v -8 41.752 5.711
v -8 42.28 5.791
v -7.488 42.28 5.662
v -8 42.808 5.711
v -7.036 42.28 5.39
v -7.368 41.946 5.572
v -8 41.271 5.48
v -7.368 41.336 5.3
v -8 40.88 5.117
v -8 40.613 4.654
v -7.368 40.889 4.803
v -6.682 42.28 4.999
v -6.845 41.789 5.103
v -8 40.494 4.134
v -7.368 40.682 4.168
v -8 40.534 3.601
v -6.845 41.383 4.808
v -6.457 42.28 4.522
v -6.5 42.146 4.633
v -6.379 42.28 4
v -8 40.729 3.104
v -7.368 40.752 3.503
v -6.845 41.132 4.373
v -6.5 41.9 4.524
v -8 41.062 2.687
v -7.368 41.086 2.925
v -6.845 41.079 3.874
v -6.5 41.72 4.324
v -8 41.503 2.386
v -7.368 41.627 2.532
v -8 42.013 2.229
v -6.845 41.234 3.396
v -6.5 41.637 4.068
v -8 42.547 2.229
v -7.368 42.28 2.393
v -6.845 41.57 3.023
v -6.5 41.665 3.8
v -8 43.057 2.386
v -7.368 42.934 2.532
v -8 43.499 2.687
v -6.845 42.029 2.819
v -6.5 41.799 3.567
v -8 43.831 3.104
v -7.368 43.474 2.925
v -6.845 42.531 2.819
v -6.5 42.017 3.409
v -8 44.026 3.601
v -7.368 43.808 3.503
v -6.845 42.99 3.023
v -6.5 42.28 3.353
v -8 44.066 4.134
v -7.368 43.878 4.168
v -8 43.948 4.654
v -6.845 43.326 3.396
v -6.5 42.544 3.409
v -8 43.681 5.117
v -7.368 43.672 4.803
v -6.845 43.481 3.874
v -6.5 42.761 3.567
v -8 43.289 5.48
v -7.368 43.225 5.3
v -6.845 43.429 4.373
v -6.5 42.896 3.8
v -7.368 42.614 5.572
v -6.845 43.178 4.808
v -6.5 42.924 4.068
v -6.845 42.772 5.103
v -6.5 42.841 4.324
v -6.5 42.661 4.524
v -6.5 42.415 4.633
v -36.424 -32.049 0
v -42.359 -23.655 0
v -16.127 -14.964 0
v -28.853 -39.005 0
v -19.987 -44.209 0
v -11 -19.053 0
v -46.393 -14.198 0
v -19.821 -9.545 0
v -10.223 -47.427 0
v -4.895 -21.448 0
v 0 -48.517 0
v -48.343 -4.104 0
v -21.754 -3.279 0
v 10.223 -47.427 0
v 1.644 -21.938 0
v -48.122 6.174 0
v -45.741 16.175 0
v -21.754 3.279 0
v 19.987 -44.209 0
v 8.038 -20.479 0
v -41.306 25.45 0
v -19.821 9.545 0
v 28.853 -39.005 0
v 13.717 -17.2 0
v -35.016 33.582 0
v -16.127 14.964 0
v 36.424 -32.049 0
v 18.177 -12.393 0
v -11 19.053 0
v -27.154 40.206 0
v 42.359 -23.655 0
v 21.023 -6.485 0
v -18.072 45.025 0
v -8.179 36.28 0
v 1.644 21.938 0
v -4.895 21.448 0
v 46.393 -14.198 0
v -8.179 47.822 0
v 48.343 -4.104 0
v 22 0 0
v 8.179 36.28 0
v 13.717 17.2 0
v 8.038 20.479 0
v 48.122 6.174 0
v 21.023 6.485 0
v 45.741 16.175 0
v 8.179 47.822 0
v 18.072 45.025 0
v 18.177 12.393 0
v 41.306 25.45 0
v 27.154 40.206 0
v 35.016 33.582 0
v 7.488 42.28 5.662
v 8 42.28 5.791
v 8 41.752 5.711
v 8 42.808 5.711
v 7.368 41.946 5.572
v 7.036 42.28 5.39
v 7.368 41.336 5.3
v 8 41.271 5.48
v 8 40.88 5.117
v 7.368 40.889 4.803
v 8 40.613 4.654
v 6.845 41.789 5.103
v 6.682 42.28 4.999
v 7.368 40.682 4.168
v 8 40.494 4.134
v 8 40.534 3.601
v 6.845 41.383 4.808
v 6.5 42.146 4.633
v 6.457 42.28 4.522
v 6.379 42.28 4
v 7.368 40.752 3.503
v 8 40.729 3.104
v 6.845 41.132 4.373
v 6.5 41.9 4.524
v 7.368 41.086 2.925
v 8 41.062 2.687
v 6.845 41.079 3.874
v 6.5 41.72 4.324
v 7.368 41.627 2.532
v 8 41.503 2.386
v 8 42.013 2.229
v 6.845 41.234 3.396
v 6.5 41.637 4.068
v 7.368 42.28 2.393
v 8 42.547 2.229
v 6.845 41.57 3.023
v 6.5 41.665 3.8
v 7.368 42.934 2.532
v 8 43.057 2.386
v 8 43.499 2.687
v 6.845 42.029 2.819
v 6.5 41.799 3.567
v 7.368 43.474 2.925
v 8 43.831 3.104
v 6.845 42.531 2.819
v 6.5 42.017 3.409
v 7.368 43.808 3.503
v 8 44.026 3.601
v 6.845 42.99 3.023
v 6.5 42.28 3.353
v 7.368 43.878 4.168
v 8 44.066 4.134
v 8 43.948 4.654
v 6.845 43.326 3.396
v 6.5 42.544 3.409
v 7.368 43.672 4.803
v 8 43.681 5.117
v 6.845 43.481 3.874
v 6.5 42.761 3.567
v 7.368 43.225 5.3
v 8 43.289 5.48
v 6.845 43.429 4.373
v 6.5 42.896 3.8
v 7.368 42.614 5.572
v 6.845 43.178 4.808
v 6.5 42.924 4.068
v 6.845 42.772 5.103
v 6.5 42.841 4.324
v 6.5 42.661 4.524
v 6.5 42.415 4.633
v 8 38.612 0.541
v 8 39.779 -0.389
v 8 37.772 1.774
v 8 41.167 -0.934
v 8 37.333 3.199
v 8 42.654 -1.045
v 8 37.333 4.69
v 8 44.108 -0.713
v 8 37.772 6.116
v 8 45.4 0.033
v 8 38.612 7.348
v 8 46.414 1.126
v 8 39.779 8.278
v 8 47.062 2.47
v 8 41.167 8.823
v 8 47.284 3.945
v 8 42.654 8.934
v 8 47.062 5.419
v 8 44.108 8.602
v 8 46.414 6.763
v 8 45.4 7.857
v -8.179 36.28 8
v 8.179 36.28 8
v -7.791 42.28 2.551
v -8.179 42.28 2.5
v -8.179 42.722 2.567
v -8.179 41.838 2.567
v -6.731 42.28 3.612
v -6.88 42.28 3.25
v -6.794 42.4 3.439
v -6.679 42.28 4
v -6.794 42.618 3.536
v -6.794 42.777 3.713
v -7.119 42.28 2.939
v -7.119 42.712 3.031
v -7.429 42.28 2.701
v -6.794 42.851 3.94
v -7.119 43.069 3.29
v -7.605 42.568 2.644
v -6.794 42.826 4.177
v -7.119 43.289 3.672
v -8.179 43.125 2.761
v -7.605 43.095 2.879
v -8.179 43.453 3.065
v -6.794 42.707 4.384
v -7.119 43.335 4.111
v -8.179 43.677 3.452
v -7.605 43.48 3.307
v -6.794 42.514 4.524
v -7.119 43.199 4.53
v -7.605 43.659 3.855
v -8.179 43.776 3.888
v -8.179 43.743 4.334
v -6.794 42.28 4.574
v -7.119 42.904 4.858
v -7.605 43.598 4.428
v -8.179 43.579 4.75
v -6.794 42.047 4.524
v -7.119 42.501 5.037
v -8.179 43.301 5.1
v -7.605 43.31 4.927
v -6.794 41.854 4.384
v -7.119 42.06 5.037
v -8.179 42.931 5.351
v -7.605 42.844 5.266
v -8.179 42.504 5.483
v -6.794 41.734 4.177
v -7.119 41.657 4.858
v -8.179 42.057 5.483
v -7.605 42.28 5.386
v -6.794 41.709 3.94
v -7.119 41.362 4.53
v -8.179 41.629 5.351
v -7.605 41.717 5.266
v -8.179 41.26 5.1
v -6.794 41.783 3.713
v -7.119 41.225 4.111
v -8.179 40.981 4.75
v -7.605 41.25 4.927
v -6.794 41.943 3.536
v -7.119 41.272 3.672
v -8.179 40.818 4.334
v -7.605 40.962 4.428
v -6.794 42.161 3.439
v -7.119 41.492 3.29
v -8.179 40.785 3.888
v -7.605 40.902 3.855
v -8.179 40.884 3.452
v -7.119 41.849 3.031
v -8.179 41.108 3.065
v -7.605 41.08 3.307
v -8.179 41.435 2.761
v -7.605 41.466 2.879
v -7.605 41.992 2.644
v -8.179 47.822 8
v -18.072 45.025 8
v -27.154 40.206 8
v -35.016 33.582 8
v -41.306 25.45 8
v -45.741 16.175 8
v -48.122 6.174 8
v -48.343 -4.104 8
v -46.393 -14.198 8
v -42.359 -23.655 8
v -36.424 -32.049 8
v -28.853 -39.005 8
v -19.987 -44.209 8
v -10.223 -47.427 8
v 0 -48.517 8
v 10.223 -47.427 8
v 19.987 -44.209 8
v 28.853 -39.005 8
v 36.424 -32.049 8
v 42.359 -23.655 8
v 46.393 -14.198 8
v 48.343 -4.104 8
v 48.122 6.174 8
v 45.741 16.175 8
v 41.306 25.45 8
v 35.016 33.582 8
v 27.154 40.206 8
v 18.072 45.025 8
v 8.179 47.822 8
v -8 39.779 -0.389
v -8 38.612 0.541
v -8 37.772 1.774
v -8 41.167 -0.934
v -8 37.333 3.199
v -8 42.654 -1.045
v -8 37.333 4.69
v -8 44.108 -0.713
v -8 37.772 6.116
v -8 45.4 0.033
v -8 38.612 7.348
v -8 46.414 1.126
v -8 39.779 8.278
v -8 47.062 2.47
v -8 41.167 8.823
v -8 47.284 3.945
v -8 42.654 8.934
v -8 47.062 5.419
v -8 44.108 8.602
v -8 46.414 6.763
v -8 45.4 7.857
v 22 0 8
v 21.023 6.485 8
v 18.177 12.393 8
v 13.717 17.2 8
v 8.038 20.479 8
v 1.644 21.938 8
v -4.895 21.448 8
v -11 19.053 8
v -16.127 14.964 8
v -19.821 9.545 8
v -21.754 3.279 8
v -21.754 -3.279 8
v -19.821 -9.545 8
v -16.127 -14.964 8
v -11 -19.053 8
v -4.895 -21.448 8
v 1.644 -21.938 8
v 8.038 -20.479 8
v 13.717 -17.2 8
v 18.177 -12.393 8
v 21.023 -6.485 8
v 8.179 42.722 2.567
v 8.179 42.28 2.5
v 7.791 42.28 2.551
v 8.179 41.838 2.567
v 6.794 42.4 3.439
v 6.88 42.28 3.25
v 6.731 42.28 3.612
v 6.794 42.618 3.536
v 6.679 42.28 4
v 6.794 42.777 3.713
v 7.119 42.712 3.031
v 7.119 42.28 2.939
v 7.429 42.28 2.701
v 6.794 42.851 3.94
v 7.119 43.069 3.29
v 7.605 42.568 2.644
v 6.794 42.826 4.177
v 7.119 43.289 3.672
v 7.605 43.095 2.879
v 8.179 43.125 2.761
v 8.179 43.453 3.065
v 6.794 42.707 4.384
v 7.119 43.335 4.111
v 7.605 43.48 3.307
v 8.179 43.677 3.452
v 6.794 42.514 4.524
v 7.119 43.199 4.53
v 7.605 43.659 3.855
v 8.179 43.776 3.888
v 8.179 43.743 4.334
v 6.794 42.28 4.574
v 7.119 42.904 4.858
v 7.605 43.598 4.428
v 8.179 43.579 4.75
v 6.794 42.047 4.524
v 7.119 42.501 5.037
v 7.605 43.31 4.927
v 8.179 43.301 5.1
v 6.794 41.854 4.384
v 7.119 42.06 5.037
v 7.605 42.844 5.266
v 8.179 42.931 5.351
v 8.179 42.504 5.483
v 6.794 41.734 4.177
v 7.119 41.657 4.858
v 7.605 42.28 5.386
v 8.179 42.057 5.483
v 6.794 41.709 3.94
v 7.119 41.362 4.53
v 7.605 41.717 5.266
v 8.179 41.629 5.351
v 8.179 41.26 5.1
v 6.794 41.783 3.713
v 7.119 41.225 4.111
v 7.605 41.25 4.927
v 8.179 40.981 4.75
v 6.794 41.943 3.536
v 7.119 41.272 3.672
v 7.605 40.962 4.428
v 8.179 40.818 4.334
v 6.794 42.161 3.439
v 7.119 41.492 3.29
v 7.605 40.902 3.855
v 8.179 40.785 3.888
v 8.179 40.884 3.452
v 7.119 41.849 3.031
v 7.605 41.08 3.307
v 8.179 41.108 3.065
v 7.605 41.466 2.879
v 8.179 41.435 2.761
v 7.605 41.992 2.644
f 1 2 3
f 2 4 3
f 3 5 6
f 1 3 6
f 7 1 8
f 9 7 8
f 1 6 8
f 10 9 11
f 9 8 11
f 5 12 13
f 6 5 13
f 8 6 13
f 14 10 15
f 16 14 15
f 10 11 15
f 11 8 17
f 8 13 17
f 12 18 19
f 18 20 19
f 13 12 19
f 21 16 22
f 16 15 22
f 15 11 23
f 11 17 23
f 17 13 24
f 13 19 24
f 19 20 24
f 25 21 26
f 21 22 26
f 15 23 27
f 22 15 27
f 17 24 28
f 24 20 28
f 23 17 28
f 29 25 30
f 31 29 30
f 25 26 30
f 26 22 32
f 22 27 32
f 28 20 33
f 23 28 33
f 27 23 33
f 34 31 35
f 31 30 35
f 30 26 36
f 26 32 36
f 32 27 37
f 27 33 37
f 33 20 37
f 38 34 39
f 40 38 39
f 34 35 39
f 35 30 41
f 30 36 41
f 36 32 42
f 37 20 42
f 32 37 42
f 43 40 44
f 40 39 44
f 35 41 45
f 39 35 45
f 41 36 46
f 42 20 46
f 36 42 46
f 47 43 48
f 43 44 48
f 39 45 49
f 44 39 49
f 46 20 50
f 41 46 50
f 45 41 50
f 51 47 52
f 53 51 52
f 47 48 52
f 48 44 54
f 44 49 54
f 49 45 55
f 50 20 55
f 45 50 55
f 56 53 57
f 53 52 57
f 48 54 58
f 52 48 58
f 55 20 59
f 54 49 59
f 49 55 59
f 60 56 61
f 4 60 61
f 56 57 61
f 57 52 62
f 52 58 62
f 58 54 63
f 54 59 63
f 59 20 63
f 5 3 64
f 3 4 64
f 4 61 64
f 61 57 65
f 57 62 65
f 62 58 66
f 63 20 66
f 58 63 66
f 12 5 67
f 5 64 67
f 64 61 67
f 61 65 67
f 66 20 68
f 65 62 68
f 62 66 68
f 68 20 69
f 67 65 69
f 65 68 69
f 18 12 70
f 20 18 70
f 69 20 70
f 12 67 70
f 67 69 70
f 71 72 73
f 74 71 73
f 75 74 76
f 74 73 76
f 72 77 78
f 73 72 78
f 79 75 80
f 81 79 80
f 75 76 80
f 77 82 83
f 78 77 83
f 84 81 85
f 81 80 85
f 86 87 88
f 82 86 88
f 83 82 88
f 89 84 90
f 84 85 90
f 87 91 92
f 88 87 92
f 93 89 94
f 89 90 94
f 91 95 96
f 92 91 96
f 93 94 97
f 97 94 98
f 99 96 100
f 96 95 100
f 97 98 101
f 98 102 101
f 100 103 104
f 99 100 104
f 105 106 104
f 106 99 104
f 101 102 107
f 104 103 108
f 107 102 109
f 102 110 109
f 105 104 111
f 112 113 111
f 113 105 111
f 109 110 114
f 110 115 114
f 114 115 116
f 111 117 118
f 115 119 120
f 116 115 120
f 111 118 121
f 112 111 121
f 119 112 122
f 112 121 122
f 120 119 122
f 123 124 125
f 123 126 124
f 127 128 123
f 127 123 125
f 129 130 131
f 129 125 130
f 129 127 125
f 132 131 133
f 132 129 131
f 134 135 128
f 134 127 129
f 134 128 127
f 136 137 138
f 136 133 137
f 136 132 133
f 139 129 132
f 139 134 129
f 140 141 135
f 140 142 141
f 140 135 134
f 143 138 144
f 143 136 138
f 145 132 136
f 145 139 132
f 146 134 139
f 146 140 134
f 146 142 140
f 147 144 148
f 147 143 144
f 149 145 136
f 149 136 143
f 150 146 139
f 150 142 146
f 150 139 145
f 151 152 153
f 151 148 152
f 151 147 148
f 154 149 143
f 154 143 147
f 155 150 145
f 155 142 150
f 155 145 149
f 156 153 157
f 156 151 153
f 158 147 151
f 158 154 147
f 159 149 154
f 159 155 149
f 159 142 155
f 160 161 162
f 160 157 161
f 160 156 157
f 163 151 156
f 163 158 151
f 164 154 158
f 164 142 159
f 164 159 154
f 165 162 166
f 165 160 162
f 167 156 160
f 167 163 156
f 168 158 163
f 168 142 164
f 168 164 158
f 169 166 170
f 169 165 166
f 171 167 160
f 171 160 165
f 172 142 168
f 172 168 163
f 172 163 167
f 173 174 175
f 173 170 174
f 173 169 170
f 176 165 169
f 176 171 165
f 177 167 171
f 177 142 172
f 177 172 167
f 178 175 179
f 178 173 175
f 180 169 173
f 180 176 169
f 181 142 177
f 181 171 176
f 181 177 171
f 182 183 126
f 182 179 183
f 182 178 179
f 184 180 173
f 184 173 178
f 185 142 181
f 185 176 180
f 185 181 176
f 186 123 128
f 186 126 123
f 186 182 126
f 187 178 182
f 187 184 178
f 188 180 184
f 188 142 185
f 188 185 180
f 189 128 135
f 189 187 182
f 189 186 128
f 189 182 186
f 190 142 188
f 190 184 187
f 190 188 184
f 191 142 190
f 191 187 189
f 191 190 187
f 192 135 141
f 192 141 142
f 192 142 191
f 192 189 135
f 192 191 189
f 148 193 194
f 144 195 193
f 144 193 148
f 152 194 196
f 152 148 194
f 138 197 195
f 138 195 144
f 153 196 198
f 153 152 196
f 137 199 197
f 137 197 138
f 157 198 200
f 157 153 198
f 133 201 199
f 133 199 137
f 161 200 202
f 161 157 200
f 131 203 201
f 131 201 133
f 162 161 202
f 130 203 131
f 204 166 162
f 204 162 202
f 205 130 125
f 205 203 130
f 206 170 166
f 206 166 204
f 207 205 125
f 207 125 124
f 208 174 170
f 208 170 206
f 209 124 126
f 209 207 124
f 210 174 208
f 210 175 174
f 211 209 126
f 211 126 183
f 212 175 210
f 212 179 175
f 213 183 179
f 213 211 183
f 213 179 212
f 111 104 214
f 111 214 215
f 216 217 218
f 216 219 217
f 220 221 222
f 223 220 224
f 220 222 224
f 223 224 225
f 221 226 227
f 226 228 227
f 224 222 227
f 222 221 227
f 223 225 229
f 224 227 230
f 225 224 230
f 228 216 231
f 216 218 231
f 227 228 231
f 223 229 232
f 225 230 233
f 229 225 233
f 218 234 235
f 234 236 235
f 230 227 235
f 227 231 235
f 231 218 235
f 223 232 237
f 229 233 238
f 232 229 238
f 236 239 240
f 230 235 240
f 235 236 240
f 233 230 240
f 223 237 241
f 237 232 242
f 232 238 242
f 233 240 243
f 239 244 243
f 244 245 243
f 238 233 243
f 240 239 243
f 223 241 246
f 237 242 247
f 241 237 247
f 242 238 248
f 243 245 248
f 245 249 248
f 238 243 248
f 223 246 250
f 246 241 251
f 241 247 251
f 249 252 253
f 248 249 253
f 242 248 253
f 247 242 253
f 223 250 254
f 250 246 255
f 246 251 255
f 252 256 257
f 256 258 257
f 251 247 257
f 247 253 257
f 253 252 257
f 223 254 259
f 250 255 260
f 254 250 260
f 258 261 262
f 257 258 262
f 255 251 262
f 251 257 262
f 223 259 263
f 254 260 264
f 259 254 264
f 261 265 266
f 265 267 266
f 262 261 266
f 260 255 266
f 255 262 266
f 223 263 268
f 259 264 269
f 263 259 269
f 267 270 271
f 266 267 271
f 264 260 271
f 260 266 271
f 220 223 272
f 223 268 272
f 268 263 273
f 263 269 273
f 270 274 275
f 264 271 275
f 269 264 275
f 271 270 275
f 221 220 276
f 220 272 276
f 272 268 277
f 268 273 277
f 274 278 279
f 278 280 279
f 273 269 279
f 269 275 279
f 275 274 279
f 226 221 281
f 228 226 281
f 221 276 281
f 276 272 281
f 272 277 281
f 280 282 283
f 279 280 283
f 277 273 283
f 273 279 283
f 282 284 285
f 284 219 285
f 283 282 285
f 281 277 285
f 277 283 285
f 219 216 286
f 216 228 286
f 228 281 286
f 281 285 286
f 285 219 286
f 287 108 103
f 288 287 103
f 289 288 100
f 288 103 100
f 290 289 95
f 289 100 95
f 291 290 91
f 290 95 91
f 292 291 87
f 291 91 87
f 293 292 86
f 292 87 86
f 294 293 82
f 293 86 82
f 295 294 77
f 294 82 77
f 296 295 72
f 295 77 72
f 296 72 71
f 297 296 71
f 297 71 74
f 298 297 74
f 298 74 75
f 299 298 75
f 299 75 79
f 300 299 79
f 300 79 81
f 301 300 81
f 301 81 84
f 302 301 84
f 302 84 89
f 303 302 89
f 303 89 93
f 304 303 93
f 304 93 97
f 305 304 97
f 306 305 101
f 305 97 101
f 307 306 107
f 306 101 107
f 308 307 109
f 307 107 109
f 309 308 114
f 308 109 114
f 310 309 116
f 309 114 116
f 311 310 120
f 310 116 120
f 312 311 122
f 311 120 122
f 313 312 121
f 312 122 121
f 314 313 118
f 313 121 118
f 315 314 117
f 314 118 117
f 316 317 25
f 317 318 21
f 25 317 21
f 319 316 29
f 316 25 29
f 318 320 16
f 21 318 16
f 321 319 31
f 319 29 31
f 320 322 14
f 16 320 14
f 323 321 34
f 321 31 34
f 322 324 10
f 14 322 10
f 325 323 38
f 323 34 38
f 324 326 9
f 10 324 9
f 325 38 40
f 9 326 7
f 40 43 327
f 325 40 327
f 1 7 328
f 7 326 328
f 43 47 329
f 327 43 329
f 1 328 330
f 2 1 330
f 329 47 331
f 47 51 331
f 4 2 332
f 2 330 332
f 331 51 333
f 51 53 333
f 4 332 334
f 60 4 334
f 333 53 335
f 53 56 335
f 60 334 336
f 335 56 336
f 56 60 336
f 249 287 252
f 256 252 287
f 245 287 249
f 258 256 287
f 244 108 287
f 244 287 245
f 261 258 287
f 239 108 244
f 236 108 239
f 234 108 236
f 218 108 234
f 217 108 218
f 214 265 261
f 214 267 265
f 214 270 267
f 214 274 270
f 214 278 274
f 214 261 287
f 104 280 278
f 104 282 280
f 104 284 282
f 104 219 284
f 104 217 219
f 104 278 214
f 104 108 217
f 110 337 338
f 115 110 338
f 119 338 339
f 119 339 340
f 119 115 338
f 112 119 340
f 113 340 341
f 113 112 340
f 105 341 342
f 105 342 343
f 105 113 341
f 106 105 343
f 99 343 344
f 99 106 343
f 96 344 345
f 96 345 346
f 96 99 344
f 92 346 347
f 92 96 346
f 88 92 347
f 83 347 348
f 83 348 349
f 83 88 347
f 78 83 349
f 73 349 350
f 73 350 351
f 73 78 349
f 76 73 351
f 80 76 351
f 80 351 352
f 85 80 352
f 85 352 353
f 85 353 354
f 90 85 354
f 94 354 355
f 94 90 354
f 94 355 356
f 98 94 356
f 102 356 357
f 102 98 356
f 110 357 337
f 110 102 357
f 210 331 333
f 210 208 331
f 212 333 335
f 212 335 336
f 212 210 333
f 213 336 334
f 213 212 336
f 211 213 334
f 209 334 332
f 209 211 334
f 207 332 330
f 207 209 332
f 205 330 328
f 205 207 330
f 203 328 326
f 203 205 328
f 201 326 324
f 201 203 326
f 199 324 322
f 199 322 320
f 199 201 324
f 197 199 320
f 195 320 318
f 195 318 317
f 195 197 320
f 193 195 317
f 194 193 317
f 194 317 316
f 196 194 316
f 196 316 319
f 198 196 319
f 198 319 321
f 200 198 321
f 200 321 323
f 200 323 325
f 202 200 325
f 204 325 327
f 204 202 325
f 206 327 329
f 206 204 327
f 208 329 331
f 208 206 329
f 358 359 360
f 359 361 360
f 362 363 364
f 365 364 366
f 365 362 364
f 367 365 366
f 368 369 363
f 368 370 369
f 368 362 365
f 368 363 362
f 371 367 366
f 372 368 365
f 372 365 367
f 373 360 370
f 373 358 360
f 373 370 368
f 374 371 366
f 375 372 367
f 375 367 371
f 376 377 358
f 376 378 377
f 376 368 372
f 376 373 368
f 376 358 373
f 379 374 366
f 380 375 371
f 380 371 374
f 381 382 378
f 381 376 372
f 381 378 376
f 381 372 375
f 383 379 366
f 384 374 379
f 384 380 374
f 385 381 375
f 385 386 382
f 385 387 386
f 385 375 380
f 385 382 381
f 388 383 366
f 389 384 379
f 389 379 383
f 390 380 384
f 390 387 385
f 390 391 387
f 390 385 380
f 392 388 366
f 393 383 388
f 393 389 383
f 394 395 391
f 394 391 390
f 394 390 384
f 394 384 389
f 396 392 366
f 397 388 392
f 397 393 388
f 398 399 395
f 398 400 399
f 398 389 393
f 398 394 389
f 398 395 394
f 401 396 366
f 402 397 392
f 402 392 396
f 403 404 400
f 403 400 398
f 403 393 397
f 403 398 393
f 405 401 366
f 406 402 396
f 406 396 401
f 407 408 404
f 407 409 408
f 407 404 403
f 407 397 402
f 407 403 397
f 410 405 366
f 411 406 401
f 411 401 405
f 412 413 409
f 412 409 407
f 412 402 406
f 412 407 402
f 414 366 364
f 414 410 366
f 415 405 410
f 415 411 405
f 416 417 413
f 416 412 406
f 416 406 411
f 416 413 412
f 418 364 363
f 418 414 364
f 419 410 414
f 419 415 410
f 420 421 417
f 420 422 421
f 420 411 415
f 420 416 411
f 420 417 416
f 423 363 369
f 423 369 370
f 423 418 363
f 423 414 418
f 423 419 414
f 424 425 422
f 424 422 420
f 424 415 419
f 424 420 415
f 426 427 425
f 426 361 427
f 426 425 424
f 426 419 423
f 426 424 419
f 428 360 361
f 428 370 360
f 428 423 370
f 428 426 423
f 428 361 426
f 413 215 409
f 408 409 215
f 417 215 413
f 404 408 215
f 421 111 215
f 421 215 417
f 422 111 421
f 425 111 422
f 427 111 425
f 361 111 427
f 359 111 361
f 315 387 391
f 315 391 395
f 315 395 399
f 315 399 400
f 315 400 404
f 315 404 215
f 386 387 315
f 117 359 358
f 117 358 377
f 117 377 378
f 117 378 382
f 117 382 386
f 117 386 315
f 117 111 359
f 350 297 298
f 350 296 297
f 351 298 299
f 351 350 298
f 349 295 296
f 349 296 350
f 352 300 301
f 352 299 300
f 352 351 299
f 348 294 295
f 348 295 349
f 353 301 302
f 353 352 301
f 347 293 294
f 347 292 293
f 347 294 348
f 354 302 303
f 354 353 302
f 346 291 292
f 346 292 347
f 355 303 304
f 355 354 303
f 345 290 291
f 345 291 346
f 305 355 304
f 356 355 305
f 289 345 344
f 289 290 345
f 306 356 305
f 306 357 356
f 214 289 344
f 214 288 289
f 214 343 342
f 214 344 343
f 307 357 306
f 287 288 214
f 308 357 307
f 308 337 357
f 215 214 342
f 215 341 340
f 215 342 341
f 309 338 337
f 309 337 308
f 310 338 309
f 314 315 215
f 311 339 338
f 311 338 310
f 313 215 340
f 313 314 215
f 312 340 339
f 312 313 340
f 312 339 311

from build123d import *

# Parameters (mm, degrees)
F0_R     = 48.5166715587
F0_R_2   = 22
F1_DEPTH = 8
F3_DEPTH = 25.4
F8_R     = 5.0035531794
F9_DEPTH = 8


# Not quite as in the source:
# - a pattern or mirror of a feature is missing from the dataset's text; its kind, count and spacing are read off the source's solid


with BuildPart() as f1:
    # F0 (on Top) → F1 (new body)
    with BuildSketch(Plane.XY):
        Circle(F0_R)
        Circle(F0_R_2, mode=Mode.SUBTRACT)
    extrude(amount=F1_DEPTH)

    # F2 (on Top) → F3 (cut)
    with BuildSketch(Plane.XY):
        Polygon((-8.1793928312, 54.083118853), (-8.1793928312, 47.8222223663), (-8.1793928312, 36.2803220355), (0, 36.2803220355), (8.1793928312, 36.2803220355), (8.1793928312, 54.083118853), align=None)
    extrude(amount=F3_DEPTH, mode=Mode.SUBTRACT)

    # F6 (on offset) → F7 (revolve)
    with BuildSketch(Plane(origin=(0, 42.2803220355, 0), x_dir=(-1, 0, 0), z_dir=(0, 1, 0))):
        with BuildLine():
            ThreePointArc((6.6793928312, 4), (7.1187326594, 2.9393398282), (8.1793928312, 2.5))
            Line((8.1793928312, 2.5), (8.1793928312, 4))
            Line((8.1793928312, 4), (6.6793928312, 4))
        make_face()
    f7 = revolve(axis=Axis((-2.9829649384, 42.2803220355, 4), (1, 0, 0)))

    # F7_copies: F7 across plane
    add(f7.mirror(Plane(origin=(0, 0, 0), x_dir=(0, 0, 1), z_dir=(1, 0, 0))))


with BuildPart() as f9:
    # F8 (on Right) → F9 (new body, symmetric)
    with BuildSketch(Plane.YZ):
        with Locations((42.2803220355, 3.9445757866)):
            Circle(F8_R)
    extrude(amount=F9_DEPTH, both=True)

    # F6 (on offset) → F10 (revolve, cut)
    with BuildSketch(Plane(origin=(0, 42.2803220355, 0), x_dir=(-1, 0, 0), z_dir=(0, 1, 0))):
        with BuildLine():
            ThreePointArc((8.1793928312, 5.8), (6.906600625, 5.2727922061), (6.3793928312, 4))
            Line((6.3793928312, 4), (6.6793928312, 4))
            ThreePointArc((6.6793928312, 4), (7.1187326594, 5.0606601718), (8.1793928312, 5.5))
            Line((8.1793928312, 5.5), (8.1793928312, 5.8))
        make_face()
        with BuildLine():
            Line((6.6793928312, 4), (8.1793928312, 4))
            Line((8.1793928312, 4), (8.1793928312, 5.5))
            ThreePointArc((8.1793928312, 5.5), (7.1187326594, 5.0606601718), (6.6793928312, 4))
        make_face()
    f10 = revolve(axis=Axis((-2.9829649384, 42.2803220355, 4), (1, 0, 0)), mode=Mode.SUBTRACT)

    # F10_copies: F10 across plane
    add(f10.mirror(Plane(origin=(0, 0, 0), x_dir=(0, 0, 1), z_dir=(1, 0, 0))), mode=Mode.SUBTRACT)


solid = Compound([f1.part, f9.part])
